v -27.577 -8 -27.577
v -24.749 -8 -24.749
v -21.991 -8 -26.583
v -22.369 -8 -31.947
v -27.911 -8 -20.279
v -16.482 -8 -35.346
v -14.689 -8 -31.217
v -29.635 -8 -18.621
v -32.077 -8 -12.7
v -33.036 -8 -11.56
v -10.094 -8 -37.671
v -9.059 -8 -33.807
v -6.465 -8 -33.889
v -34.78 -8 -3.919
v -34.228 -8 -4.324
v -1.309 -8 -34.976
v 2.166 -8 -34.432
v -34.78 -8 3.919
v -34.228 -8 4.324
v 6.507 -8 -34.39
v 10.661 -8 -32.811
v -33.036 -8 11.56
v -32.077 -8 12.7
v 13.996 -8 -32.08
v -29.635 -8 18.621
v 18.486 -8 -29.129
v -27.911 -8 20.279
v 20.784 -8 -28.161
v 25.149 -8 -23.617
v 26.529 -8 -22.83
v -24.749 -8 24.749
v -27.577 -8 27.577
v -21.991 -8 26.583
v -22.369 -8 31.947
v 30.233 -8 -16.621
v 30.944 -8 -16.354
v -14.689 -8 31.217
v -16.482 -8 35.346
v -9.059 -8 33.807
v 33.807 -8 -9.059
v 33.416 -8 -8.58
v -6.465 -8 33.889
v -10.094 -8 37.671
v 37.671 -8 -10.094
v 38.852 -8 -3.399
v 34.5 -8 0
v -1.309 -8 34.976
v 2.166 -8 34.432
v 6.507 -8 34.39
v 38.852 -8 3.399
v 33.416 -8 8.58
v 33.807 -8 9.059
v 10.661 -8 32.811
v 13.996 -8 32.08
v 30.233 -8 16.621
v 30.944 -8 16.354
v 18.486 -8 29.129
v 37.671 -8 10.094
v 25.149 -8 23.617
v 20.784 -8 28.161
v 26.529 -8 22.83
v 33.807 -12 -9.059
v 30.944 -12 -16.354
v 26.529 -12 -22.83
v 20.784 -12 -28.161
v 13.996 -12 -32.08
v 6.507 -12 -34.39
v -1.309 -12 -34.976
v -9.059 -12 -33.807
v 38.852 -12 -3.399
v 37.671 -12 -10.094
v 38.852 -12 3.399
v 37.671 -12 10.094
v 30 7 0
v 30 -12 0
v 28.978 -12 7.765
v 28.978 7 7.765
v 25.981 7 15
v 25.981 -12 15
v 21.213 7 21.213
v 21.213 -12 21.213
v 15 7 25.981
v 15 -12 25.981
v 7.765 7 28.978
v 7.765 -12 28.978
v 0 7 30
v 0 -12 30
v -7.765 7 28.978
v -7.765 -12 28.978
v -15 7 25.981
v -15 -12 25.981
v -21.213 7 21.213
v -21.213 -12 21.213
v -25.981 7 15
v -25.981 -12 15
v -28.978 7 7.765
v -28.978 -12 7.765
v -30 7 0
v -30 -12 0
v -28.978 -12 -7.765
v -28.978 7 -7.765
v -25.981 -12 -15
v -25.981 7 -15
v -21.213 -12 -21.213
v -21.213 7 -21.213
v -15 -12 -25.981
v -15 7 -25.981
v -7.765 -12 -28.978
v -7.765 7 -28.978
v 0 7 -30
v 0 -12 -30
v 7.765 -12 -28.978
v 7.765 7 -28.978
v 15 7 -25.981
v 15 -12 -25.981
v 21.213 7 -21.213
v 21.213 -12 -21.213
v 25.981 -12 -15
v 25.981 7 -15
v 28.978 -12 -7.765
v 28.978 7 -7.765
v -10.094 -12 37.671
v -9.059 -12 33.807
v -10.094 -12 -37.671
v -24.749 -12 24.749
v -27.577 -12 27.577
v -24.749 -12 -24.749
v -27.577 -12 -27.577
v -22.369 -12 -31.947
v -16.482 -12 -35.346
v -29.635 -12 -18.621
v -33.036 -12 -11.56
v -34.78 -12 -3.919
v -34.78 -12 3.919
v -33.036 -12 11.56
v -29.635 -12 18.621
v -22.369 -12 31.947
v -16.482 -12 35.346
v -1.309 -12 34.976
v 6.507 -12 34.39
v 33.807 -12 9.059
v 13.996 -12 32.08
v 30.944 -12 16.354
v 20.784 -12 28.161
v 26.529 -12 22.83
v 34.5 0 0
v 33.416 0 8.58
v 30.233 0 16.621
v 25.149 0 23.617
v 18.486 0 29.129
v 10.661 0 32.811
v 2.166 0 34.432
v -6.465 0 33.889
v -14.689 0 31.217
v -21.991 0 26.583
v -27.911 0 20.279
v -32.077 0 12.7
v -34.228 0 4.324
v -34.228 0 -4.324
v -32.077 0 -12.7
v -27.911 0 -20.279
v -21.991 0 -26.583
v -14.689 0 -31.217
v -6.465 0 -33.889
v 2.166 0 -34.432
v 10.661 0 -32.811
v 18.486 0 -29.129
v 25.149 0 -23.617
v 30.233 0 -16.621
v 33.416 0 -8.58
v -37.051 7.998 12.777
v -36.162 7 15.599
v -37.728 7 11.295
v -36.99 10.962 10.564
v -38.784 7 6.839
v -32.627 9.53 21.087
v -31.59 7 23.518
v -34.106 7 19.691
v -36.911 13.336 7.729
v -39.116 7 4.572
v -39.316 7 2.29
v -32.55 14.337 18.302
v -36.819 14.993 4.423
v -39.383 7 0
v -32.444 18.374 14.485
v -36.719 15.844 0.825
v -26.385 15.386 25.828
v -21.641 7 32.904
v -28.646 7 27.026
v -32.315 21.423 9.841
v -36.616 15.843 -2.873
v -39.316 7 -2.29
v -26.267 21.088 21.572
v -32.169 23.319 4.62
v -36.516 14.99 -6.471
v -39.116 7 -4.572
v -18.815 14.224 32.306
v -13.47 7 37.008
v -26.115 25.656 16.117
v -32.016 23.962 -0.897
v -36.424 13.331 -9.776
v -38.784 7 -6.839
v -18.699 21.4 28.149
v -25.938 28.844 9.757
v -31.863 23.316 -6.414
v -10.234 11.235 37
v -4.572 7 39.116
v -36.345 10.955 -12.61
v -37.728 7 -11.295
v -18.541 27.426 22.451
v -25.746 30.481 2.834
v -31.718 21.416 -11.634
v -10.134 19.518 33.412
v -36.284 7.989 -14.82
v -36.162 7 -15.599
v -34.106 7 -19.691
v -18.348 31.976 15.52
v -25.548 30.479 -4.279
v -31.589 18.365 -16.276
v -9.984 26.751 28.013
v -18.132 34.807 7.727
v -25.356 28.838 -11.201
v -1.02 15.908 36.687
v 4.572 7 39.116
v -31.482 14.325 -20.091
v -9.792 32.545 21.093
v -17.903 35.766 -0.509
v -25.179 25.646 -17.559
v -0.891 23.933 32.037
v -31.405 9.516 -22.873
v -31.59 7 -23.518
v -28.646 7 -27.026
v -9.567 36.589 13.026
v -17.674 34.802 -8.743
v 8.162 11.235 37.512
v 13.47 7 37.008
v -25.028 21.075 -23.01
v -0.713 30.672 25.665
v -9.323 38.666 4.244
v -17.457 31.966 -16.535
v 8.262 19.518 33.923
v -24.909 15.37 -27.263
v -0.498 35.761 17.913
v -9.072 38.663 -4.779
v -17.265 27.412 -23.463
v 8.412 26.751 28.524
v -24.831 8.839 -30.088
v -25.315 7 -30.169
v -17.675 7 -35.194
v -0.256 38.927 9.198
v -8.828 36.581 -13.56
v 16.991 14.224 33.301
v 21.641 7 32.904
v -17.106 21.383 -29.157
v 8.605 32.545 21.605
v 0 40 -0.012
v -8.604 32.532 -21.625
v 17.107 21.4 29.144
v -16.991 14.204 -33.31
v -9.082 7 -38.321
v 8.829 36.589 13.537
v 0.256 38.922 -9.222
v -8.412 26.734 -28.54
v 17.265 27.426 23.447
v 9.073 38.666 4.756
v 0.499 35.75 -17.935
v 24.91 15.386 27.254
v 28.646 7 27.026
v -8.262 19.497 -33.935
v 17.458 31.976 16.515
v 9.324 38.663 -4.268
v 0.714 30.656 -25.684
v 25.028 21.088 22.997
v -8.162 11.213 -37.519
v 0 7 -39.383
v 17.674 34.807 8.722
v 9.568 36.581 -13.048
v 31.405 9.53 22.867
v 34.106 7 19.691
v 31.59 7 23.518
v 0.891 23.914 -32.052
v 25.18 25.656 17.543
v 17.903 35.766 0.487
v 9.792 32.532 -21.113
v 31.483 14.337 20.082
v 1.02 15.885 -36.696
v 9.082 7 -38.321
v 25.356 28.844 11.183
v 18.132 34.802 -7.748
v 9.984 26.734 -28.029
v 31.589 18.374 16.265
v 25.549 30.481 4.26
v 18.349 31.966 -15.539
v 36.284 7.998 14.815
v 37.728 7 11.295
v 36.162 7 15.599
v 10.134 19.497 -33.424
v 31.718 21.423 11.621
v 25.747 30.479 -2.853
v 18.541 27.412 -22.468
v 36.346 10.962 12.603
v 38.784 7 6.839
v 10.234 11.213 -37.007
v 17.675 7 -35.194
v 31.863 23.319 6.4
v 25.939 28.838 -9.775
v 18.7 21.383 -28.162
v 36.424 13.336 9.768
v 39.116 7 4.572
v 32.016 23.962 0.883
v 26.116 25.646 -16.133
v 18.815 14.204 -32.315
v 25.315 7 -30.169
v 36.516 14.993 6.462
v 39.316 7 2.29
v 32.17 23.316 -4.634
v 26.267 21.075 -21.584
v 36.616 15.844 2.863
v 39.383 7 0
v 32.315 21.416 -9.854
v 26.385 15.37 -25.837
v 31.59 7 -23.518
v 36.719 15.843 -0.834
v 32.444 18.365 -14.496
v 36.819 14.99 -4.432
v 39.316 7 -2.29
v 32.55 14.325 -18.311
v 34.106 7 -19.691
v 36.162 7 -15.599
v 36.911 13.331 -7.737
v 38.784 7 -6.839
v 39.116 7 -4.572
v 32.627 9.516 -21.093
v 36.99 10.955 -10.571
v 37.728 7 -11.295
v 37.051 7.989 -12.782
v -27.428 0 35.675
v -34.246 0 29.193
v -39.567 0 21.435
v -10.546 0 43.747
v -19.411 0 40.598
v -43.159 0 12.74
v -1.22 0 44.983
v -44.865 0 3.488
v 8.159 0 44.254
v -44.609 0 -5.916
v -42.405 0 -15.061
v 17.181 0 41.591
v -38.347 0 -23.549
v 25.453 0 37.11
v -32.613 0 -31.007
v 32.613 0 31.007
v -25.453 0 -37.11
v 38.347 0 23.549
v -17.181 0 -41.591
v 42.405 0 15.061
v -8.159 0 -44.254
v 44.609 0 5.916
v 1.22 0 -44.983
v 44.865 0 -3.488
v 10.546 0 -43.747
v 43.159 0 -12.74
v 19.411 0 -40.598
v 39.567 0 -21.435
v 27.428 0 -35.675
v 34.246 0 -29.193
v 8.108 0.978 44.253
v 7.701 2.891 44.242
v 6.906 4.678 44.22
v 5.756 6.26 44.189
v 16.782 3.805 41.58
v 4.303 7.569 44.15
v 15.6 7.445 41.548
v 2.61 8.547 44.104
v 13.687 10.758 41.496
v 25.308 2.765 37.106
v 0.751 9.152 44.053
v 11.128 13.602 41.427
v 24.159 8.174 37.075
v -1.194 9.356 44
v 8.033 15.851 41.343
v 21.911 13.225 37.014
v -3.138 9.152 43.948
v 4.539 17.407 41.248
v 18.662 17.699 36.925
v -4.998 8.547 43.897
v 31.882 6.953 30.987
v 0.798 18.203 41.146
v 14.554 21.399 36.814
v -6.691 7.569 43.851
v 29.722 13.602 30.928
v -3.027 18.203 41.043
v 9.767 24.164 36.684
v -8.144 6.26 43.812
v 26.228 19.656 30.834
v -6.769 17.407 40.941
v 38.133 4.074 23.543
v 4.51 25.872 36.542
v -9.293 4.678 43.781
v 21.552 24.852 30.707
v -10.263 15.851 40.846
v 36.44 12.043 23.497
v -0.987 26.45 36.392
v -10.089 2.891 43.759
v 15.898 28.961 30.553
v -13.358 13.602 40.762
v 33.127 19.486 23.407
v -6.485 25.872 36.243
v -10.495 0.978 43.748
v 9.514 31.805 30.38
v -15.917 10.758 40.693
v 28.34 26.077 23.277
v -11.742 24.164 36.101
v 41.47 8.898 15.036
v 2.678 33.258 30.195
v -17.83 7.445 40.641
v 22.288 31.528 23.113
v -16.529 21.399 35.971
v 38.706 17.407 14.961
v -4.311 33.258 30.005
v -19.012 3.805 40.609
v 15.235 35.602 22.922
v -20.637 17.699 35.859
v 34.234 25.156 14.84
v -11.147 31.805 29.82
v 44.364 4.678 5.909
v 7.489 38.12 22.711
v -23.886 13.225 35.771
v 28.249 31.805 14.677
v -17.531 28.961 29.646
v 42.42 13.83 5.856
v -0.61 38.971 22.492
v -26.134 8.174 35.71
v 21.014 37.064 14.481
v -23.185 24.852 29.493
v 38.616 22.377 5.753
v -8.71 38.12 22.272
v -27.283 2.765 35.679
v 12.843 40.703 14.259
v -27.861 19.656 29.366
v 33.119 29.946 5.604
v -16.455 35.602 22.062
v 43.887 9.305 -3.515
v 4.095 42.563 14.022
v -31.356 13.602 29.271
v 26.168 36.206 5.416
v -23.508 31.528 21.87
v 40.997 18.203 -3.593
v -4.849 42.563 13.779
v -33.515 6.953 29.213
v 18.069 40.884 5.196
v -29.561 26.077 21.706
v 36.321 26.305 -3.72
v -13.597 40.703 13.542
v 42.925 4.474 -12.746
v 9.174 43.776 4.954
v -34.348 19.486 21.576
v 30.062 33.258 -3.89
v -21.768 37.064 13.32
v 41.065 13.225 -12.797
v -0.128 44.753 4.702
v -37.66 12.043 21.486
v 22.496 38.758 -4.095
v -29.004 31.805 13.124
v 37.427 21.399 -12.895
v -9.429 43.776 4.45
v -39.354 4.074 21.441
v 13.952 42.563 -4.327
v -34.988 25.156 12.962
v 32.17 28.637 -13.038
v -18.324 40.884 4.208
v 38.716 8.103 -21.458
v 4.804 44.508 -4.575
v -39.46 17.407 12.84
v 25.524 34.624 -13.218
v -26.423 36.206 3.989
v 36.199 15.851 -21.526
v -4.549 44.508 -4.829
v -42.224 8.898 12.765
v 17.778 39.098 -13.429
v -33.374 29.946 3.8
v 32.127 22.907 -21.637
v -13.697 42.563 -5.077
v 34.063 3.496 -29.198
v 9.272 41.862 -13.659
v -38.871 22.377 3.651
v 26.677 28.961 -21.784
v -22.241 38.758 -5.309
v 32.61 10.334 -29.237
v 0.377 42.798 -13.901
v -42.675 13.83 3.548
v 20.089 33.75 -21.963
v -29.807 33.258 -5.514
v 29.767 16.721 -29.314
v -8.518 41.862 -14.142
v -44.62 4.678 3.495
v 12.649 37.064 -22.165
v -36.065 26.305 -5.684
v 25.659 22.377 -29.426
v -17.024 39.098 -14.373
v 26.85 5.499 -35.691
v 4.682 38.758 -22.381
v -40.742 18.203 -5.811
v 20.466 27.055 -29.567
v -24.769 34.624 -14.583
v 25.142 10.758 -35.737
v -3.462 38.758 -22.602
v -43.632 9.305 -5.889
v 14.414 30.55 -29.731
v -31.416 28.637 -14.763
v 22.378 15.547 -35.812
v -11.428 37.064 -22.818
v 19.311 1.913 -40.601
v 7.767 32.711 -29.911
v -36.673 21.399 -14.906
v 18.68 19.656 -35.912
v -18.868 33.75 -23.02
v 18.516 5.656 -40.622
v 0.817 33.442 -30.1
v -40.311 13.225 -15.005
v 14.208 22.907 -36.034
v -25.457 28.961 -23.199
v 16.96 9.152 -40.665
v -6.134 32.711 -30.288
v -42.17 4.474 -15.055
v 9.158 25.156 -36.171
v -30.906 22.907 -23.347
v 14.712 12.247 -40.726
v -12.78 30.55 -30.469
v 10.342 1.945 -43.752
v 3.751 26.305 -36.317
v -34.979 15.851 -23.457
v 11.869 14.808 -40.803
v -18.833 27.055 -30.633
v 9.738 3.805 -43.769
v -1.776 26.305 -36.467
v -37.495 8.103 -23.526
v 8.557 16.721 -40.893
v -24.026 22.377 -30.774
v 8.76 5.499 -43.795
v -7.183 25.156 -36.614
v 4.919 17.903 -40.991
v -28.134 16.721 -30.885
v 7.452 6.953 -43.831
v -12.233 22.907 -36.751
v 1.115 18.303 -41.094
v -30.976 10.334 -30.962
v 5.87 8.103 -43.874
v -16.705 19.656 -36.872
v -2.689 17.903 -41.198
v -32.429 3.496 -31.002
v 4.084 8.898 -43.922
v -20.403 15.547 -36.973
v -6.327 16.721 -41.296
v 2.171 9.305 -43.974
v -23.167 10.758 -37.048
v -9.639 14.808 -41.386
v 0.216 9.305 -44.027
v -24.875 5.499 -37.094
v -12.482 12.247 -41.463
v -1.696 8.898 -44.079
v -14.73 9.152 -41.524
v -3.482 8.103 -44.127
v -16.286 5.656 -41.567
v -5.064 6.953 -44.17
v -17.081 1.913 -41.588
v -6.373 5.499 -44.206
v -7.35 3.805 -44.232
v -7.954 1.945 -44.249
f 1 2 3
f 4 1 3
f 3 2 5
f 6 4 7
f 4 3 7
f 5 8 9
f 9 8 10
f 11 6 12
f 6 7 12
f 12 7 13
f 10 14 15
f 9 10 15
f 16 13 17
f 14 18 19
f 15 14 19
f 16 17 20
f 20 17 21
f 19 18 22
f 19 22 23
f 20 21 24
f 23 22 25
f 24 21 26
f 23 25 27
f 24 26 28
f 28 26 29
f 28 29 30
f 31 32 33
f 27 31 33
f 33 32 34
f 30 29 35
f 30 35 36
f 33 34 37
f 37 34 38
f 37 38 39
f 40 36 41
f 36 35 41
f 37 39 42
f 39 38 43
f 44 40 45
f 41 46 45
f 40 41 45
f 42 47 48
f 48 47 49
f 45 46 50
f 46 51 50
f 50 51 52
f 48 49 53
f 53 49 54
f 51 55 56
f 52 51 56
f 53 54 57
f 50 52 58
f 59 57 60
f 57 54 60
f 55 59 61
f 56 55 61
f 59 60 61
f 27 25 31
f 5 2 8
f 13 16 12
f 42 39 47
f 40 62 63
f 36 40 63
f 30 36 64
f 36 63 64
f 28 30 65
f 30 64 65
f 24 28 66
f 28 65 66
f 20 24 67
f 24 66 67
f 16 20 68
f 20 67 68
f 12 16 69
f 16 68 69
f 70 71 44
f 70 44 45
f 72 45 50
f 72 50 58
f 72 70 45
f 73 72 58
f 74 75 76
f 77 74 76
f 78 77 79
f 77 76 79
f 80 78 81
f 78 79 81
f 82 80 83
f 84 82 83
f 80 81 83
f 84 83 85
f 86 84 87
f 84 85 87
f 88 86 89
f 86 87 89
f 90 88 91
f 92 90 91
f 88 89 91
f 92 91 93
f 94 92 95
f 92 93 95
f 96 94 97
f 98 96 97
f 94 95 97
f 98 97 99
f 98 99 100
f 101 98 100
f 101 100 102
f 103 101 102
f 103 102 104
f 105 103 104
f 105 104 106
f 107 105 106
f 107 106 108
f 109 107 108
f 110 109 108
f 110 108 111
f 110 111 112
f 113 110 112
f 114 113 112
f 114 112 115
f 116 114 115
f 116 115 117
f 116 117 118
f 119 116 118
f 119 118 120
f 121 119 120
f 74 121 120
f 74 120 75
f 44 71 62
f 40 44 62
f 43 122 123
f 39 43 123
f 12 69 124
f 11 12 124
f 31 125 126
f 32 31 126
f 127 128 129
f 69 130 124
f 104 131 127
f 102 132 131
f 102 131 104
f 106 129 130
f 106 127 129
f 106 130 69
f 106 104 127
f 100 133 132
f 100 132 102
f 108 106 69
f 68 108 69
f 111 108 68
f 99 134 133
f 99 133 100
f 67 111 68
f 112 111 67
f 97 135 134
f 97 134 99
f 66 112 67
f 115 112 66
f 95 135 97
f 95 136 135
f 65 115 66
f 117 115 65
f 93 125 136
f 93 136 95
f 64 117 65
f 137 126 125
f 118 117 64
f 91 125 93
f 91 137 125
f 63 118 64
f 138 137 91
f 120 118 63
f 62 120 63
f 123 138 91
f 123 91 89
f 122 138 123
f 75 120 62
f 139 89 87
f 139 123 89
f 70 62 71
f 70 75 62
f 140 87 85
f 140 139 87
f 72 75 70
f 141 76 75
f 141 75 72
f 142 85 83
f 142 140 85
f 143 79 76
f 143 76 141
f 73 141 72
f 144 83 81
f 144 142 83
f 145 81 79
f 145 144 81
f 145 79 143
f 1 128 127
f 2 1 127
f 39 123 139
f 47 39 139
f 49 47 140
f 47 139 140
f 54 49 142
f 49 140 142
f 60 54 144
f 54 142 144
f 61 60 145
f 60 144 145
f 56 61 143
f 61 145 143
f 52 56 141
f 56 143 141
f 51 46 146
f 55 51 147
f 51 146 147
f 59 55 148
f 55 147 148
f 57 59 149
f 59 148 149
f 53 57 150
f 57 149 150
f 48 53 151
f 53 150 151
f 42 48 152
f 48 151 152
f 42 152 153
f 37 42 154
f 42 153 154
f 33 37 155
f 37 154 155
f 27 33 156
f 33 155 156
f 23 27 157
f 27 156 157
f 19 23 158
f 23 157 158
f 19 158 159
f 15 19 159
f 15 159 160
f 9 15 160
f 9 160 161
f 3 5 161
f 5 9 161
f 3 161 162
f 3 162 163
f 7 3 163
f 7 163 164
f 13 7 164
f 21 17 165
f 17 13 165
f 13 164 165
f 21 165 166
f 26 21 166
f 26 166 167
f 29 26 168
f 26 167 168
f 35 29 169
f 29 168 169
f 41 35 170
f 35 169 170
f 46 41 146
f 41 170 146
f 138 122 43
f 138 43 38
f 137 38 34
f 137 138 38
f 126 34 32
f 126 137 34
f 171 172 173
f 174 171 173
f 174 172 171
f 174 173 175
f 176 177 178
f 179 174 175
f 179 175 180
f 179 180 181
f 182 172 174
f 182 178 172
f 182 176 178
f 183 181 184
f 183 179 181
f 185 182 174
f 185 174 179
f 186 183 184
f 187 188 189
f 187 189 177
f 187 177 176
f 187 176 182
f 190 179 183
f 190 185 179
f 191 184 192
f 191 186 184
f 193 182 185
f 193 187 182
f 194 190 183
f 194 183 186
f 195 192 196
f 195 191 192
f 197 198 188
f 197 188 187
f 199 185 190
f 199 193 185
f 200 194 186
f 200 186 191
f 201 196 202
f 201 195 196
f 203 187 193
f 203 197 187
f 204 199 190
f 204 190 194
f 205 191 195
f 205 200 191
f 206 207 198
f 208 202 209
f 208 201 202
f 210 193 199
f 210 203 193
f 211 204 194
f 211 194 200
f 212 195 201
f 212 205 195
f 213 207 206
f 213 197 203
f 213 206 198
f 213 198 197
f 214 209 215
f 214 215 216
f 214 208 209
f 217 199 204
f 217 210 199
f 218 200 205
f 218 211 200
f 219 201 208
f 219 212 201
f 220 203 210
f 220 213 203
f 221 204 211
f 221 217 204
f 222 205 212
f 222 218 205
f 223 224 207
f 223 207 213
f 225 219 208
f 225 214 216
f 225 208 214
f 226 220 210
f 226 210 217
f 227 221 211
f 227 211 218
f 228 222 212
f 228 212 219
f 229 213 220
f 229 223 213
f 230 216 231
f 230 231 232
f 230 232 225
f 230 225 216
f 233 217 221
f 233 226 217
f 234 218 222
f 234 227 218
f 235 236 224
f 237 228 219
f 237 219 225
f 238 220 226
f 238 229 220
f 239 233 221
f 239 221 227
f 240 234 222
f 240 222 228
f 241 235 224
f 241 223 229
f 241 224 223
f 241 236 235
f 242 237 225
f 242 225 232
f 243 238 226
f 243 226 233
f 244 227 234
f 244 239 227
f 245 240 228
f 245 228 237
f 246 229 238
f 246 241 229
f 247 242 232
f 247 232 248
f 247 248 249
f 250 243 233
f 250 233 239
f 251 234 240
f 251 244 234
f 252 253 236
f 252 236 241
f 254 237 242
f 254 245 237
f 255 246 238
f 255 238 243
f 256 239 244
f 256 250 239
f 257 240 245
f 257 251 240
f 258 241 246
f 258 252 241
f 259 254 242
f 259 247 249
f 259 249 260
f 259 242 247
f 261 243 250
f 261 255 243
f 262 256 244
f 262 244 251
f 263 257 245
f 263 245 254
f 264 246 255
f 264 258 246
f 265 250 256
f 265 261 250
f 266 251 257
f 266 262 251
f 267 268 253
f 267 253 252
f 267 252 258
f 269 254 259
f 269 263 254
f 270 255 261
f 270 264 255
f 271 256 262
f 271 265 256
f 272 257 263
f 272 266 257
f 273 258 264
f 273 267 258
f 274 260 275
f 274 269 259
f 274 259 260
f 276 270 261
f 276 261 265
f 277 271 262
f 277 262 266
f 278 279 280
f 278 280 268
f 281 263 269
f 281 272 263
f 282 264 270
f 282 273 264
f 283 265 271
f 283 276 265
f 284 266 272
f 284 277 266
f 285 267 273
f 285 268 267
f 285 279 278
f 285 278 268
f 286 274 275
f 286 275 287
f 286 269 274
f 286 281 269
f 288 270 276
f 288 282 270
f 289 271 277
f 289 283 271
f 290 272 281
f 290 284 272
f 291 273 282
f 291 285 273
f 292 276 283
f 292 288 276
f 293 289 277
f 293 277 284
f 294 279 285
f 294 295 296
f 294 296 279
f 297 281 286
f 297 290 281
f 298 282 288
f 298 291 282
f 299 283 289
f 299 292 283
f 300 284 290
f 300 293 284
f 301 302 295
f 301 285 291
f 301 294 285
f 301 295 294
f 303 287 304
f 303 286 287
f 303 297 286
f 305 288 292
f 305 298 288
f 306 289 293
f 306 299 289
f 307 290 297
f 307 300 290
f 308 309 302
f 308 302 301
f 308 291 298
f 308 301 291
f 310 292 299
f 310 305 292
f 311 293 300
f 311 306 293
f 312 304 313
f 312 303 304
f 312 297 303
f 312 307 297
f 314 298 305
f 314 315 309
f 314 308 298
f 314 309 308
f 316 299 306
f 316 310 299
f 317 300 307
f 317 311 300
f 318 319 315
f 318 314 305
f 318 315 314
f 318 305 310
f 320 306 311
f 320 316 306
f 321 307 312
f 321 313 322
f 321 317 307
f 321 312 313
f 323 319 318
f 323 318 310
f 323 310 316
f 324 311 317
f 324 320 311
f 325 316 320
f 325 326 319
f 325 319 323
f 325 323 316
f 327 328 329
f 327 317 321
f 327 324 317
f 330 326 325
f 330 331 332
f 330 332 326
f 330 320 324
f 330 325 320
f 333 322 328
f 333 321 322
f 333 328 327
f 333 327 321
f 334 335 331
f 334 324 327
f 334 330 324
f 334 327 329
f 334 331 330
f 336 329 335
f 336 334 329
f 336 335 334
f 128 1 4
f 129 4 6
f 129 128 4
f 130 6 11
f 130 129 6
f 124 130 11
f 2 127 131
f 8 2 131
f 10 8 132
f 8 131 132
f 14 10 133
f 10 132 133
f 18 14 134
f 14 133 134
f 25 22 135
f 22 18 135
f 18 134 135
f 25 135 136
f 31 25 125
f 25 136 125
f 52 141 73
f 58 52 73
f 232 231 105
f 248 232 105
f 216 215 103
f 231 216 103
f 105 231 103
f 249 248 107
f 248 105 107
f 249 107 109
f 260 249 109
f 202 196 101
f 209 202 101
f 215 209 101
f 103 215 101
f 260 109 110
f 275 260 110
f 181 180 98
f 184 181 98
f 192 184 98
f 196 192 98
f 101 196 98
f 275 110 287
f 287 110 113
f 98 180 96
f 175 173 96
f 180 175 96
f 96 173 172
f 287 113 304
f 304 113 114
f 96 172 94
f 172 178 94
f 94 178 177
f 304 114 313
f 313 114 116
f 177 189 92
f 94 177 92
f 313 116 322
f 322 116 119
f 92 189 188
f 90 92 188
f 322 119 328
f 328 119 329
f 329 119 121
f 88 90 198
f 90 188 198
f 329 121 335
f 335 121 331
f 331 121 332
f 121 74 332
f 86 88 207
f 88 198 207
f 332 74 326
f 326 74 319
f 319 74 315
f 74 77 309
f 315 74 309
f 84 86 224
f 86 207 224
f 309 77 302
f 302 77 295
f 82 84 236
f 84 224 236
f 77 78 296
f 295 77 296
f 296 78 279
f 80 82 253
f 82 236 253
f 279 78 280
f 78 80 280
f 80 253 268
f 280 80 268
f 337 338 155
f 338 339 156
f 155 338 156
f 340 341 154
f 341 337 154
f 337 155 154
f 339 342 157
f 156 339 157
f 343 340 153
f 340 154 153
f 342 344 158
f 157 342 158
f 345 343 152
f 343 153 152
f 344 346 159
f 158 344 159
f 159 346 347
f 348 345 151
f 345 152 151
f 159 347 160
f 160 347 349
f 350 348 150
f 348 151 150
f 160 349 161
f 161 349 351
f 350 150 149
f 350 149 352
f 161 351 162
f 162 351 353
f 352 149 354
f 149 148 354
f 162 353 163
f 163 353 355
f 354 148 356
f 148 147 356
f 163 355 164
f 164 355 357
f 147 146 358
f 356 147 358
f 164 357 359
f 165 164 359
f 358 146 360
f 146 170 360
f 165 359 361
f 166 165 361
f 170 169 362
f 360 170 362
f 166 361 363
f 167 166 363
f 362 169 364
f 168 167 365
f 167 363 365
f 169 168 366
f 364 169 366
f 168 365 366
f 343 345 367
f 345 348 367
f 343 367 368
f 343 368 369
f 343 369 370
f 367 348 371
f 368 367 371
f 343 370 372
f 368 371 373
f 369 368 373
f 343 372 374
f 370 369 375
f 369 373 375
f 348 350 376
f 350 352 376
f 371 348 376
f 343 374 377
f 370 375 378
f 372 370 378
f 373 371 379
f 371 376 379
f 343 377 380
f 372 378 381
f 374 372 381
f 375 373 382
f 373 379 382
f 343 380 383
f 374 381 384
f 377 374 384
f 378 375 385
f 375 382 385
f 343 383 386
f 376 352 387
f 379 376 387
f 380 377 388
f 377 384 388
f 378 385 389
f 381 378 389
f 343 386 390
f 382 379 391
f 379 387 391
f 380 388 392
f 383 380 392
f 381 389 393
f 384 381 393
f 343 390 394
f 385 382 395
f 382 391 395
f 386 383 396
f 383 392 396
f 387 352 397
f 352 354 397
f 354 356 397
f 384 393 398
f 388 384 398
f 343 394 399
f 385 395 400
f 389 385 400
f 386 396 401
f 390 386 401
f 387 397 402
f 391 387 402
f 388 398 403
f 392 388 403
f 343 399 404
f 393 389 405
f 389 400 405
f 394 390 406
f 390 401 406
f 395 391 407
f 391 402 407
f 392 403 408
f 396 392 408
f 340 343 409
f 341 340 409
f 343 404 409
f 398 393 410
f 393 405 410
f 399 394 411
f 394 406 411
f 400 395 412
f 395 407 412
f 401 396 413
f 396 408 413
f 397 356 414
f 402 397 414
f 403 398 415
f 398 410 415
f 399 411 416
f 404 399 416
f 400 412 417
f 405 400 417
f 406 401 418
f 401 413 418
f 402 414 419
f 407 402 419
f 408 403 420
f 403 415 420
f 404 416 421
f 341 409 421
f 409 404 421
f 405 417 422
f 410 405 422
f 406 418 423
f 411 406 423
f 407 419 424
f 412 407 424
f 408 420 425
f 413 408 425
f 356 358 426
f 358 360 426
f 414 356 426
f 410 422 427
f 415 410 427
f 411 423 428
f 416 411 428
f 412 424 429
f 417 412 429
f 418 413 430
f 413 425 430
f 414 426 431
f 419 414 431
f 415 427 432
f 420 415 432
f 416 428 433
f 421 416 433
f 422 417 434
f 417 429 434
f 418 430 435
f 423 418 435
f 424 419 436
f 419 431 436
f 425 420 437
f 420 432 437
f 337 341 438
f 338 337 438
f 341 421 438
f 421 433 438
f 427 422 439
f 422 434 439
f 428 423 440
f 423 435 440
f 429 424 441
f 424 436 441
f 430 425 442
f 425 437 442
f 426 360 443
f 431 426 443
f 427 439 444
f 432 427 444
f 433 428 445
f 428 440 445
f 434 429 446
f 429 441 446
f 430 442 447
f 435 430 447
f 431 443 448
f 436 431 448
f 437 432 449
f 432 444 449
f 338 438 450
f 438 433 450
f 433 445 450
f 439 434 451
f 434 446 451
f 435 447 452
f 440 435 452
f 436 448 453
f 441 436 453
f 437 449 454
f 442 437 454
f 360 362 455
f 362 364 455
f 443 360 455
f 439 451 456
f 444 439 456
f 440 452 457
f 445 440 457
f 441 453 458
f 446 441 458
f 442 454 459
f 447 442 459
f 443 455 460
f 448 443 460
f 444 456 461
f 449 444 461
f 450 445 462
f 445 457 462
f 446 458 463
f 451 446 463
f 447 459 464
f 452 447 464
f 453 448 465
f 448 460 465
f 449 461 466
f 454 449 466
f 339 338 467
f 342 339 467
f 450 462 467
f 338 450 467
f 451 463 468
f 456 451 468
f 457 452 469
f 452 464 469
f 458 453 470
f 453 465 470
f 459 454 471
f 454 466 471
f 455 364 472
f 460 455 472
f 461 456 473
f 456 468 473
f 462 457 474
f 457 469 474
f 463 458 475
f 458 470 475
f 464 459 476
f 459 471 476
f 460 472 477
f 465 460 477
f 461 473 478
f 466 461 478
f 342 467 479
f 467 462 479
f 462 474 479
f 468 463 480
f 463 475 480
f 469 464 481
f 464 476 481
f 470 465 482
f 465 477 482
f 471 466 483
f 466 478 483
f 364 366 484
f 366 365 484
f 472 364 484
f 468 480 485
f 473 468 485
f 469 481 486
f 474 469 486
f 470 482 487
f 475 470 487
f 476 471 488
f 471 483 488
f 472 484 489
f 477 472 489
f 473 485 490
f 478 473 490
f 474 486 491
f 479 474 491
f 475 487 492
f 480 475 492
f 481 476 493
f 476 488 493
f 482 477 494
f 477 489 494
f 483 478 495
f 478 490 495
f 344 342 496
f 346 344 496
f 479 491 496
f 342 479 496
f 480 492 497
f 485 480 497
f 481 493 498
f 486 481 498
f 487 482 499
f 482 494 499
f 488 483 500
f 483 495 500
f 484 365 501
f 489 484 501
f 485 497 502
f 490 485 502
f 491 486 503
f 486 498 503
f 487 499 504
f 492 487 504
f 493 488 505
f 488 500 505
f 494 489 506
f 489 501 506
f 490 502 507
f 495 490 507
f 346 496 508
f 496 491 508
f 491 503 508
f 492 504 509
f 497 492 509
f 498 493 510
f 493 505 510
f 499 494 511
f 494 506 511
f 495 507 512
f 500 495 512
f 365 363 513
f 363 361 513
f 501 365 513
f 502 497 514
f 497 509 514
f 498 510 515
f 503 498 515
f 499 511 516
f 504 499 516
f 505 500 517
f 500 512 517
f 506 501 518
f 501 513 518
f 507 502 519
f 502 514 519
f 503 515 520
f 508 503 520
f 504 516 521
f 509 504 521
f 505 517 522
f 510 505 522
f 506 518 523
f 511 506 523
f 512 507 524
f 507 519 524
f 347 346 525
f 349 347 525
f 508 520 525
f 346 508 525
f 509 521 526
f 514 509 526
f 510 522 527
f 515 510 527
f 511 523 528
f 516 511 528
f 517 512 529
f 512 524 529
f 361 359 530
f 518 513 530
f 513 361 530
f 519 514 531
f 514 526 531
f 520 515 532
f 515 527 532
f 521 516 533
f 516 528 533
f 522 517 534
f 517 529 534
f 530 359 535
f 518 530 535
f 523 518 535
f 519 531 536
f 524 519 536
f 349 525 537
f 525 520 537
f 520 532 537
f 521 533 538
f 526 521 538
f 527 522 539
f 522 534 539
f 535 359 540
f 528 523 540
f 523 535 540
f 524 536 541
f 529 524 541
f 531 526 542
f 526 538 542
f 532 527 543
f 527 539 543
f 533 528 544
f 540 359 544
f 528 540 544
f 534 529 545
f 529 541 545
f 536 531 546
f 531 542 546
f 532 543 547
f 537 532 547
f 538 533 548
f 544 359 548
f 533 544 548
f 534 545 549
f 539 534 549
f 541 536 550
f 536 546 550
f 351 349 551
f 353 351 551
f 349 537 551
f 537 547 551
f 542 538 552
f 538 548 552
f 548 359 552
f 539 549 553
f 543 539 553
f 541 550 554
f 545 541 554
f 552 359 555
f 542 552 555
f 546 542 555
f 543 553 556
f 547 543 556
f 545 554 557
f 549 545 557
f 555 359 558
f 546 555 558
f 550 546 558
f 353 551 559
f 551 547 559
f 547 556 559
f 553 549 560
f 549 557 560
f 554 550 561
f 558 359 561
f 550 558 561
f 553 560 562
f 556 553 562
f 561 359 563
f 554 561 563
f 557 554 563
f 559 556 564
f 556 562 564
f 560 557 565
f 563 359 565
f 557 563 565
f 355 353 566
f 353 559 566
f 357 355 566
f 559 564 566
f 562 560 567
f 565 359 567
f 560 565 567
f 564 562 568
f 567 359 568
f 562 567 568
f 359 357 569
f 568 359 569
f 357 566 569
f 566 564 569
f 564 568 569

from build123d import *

# Parameters (mm, degrees)
REVOLVE1_ANGLE      = 180
SKETCH4_R           = 41.29501491
BOSS_EXTRUDE1_DEPTH = 7
SKETCH5_R           = 34.5
BOSS_EXTRUDE2_DEPTH = 12
SKETCH6_R           = 39
BOSS_EXTRUDE4_DEPTH = 4
SKETCH7_R           = 30
CUT_EXTRUDE1_DEPTH  = 24
CUT_EXTRUDE2_DEPTH  = 10


with BuildPart() as part:
    # Sketch1 → Revolve1 (revolve)
    with BuildSketch(Plane(origin=(0, 0, 0), x_dir=(1, 0, 0), z_dir=(0, 1, 0))):
        with BuildLine():
            Line((1.220496419, 44.983445716), (-1.220496419, -44.983445716))
            ThreePointArc((-1.220496419, -44.983445716), (44.983445716, -1.220496419), (1.220496419, 44.983445716))
        make_face()
    revolve(axis=Axis((1.220496419, 0, -44.983445716), (-0.027122143, 0, 0.999632127)), revolution_arc=REVOLVE1_ANGLE)

    # Sketch2 → Cut-Revolve1 (revolve, cut)
    with BuildSketch(Plane.XZ):
        with BuildLine():
            Line((39.984553657, 1.111516454), (-39.984553657, -1.111516454))
            ThreePointArc((-39.984553657, -1.111516454), (-1.111516454, 39.984553657), (39.984553657, 1.111516454))
        make_face()
    revolve(axis=Axis((39.984553657, 0, 1.111516454), (-0.999613841, 0, -0.027787911)), mode=Mode.SUBTRACT)

    # Sketch4 → Boss-Extrude1 (add)
    with BuildSketch(Plane.XZ):
        Circle(SKETCH4_R)
    extrude(amount=-BOSS_EXTRUDE1_DEPTH)

    # Sketch5 → Boss-Extrude2 (add)
    with BuildSketch(Plane.XZ):
        Circle(SKETCH5_R)
    extrude(amount=BOSS_EXTRUDE2_DEPTH)

    # Sketch6 → Boss-Extrude4 (add)
    with BuildSketch(Plane.XZ.offset(12)):
        Circle(SKETCH6_R)
    extrude(amount=-BOSS_EXTRUDE4_DEPTH)

    # Sketch7 → Cut-Extrude1 (cut)
    with BuildSketch(Plane.XZ.offset(12)):
        Circle(SKETCH7_R)
    extrude(amount=-CUT_EXTRUDE1_DEPTH, mode=Mode.SUBTRACT)

    # Sketch8 → Cut-Extrude2 (cut)
    with BuildSketch(Plane.XZ.offset(12)):
        with BuildLine():
            ThreePointArc((37.671107225, 10.093942759), (19.5, 33.774990748), (-10.093942759, 37.671107225))
            Line((-10.093942759, 37.671107225), (-9.058666579, 33.80740392))
            ThreePointArc((-9.058666579, 33.80740392), (17.5, 30.310889132), (33.80740392, 9.058666579))
            Line((33.80740392, 9.058666579), (37.671107225, 10.093942759))
        make_face()
        with BuildLine():
            ThreePointArc((-10.093942759, -37.671107225), (19.5, -33.774990748), (37.671107225, -10.093942759))
            Line((37.671107225, -10.093942759), (33.80740392, -9.058666579))
            ThreePointArc((33.80740392, -9.058666579), (17.5, -30.310889132), (-9.058666579, -33.80740392))
            Line((-9.058666579, -33.80740392), (-10.093942759, -37.671107225))
        make_face()
        with BuildLine():
            Line((-24.748737342, 24.748737342), (-27.577164466, 27.577164466))
            ThreePointArc((-27.577164466, 27.577164466), (-39, 0), (-27.577164466, -27.577164466))
            Line((-27.577164466, -27.577164466), (-24.748737342, -24.748737342))
            ThreePointArc((-24.748737342, -24.748737342), (-35, 0), (-24.748737342, 24.748737342))
        make_face()
    extrude(amount=-CUT_EXTRUDE2_DEPTH, mode=Mode.SUBTRACT)


solid = part.part
